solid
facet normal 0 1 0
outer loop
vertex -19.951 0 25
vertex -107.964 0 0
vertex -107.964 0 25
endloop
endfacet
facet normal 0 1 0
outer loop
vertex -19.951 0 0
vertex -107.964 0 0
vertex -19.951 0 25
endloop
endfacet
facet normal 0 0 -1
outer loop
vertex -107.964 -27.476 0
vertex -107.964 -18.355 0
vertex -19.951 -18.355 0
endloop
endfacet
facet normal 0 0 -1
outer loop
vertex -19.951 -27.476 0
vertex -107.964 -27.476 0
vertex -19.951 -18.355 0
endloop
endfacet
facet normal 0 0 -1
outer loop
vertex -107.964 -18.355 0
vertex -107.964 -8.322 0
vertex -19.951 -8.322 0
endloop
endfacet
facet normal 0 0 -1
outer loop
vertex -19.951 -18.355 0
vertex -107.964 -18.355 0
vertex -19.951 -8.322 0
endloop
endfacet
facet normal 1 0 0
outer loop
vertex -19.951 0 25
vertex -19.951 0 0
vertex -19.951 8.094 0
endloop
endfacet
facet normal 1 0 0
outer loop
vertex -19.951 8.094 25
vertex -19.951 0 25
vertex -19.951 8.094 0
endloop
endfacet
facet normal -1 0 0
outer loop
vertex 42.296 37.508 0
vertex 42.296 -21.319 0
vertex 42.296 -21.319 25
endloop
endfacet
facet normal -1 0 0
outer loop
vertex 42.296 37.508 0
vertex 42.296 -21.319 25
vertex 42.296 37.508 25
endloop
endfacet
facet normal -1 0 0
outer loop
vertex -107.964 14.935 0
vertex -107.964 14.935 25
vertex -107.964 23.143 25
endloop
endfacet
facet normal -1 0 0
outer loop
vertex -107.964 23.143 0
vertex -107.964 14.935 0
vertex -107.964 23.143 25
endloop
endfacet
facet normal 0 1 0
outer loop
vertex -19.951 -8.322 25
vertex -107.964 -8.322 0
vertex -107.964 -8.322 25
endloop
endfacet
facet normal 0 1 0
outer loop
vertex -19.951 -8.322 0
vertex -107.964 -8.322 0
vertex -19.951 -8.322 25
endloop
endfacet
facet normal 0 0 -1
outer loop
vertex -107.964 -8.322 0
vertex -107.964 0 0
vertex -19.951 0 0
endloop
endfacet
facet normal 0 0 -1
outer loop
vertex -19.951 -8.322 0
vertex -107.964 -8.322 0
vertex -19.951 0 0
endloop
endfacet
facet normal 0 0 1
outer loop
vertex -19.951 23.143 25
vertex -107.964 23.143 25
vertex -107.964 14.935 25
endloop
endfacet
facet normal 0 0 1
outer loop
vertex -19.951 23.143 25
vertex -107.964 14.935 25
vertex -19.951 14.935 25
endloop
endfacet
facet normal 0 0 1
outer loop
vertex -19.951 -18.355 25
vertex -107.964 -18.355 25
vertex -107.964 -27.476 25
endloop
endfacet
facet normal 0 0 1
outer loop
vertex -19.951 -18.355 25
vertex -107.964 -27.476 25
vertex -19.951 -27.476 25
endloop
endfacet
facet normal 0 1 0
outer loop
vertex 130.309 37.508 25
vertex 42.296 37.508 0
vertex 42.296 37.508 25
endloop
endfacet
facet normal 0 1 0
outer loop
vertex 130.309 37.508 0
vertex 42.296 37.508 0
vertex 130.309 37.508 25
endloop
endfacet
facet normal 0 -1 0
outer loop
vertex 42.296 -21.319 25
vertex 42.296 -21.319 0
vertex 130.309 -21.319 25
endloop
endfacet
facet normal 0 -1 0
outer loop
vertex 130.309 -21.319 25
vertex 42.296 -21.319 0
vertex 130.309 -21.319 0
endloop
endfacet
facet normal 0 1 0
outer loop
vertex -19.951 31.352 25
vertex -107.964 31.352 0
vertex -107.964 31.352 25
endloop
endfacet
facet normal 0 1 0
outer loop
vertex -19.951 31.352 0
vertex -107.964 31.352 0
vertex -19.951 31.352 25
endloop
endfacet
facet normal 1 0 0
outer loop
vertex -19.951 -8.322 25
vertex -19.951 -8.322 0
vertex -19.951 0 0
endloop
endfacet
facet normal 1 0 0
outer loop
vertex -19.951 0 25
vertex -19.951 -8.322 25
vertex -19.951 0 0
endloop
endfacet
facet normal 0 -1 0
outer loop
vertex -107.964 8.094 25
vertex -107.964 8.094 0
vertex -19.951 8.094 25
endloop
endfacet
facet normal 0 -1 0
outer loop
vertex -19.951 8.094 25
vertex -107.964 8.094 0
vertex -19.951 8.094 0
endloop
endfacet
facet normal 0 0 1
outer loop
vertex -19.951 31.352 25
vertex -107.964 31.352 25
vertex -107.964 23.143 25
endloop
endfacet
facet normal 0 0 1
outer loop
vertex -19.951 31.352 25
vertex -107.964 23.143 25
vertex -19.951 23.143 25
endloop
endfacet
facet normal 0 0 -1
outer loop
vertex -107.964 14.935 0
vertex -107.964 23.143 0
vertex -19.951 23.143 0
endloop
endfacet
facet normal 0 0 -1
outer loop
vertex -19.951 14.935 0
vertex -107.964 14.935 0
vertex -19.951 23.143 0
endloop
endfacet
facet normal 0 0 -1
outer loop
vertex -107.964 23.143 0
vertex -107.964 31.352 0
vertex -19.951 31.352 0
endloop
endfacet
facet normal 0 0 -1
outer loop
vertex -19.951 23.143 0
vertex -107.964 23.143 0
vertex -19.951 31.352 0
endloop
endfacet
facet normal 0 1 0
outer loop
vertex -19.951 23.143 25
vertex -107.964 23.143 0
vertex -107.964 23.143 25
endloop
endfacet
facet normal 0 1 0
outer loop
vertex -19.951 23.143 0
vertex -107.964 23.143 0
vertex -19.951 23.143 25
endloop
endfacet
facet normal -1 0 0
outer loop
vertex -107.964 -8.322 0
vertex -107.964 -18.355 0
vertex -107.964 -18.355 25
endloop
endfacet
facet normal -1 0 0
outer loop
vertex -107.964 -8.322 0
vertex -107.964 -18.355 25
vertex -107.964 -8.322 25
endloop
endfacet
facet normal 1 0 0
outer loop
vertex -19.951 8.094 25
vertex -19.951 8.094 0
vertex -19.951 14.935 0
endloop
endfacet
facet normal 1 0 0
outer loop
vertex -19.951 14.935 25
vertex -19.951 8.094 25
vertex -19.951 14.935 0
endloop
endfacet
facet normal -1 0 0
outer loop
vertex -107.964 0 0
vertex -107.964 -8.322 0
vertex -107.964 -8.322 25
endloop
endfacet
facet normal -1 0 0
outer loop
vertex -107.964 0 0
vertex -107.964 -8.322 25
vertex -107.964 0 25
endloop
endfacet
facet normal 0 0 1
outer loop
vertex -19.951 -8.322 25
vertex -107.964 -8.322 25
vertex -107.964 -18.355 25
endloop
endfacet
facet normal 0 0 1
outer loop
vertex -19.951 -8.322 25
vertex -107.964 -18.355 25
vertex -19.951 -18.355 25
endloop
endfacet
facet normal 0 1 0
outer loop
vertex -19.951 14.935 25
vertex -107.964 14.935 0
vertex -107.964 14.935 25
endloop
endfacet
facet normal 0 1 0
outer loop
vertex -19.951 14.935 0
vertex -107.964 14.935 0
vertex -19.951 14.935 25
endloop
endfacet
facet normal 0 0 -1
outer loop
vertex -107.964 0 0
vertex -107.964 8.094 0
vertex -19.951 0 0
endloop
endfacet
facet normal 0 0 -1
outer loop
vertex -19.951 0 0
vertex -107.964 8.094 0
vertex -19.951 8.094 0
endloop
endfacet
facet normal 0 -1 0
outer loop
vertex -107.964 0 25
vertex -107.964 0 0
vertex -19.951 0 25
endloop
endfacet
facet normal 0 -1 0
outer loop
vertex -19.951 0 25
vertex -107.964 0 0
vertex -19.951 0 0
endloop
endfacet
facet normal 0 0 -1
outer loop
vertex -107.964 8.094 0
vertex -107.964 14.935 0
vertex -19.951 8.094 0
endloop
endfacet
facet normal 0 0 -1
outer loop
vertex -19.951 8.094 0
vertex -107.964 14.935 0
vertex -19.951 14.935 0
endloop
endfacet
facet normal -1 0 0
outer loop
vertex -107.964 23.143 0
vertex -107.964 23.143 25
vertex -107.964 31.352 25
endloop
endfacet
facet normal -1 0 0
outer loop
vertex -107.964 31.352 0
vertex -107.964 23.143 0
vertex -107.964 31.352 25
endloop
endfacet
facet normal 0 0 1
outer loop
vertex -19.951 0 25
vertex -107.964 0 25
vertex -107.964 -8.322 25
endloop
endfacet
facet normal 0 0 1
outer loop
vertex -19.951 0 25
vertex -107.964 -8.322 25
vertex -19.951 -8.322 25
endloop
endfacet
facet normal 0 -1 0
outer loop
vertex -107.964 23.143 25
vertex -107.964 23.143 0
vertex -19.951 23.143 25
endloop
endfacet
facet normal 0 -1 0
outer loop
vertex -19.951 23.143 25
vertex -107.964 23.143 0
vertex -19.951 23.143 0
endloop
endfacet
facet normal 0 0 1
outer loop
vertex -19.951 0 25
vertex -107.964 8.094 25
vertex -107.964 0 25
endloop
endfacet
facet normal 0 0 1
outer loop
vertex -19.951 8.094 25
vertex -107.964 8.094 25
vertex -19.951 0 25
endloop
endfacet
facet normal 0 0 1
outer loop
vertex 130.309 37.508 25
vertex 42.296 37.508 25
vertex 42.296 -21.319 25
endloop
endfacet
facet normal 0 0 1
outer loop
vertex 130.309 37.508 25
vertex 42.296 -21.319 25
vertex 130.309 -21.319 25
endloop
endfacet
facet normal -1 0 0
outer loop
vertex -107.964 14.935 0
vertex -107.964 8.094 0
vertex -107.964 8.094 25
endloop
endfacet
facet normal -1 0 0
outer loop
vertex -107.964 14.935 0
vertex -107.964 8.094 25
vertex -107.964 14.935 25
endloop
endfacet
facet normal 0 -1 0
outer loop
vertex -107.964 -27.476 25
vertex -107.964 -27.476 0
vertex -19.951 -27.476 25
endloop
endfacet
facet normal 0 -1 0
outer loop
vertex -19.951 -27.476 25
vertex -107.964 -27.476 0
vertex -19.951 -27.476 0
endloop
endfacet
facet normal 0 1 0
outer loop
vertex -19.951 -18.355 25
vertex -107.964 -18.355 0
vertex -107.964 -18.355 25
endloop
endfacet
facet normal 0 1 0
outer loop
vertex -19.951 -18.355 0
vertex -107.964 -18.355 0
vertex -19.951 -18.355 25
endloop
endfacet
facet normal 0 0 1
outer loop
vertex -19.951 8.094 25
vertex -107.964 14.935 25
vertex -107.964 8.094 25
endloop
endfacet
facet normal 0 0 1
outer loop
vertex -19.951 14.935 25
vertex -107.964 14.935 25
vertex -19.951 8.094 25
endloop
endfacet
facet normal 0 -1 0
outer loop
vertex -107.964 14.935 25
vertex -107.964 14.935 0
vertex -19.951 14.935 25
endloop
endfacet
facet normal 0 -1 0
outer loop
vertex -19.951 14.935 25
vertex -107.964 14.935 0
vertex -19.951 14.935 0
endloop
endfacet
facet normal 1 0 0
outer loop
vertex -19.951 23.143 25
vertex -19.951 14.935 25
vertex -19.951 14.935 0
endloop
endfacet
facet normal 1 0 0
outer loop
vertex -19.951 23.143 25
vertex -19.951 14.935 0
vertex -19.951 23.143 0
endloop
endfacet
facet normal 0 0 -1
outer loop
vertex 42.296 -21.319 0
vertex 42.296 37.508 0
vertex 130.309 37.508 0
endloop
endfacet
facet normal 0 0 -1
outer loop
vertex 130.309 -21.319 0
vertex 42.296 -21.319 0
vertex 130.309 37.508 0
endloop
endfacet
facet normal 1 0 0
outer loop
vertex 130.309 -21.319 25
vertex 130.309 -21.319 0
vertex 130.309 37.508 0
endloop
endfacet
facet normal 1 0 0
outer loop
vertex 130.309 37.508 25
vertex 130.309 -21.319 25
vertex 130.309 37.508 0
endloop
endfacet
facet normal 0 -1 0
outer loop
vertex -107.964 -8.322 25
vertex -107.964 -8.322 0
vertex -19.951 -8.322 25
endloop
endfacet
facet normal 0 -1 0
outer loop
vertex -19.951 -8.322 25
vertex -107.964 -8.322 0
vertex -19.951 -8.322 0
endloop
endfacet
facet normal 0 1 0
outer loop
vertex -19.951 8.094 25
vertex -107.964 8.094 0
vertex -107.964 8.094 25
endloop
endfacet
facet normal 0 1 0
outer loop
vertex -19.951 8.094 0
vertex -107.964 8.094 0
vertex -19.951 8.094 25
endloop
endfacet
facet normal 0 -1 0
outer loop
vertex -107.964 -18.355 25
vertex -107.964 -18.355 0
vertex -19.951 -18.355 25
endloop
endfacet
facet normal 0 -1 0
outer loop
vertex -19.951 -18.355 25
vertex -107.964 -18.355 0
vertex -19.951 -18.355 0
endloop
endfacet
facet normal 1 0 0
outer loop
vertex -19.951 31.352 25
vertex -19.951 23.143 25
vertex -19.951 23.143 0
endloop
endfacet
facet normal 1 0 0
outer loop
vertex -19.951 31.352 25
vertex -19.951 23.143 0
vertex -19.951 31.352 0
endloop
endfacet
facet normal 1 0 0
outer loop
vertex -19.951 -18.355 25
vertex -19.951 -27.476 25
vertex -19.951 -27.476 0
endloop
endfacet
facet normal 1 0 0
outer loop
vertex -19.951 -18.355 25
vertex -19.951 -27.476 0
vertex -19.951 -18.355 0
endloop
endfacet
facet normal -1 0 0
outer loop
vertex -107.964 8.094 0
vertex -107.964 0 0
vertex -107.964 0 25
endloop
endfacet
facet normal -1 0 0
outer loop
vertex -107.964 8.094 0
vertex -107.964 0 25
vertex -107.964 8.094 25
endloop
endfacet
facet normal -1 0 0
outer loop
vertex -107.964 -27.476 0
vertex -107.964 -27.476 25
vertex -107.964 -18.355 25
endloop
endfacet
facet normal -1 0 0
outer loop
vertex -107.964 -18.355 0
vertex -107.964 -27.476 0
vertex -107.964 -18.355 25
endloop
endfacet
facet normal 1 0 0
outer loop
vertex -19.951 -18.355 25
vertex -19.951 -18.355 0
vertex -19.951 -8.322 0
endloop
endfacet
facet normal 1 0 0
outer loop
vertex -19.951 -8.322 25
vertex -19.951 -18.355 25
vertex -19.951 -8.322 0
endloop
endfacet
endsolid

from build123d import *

# Parameters (mm, degrees)
F0_W     = 88.01288
F0_H     = 58.82726
F1_DEPTH = 25
F0_H_2   = 8.208456
F2_DEPTH = 25
F3_DEPTH = 25
F0_H_3   = 6.840379
F4_DEPTH = 25
F0_H_4   = 8.094443
F5_DEPTH = 25
F0_H_5   = 8.322465
F6_DEPTH = 25
F0_H_6   = 10.032556
F7_DEPTH = 25
F0_H_7   = 9.120506
F8_DEPTH = 25


with BuildPart() as f1:
    # F0 (on Top) → F1 (new body)
    with BuildSketch(Plane.XY):
        with Locations((86.302772, 8.094443)):
            Rectangle(F0_W, F0_H)
    extrude(amount=F1_DEPTH)


with BuildPart() as f2:
    # F0 (on Top) → F2 (new body)
    with BuildSketch(Plane.XY):
        with Locations((-63.957547, 27.247506)):
            Rectangle(F0_W, F0_H_2)
    extrude(amount=F2_DEPTH)


with BuildPart() as f3:
    # F0 (on Top) → F3 (new body)
    with BuildSketch(Plane.XY):
        with Locations((-63.957547, 19.03905)):
            Rectangle(F0_W, F0_H_2)
    extrude(amount=F3_DEPTH)


with BuildPart() as f4:
    # F0 (on Top) → F4 (new body)
    with BuildSketch(Plane.XY):
        with Locations((-63.957547, 11.514632)):
            Rectangle(F0_W, F0_H_3)
    extrude(amount=F4_DEPTH)


with BuildPart() as f5:
    # F0 (on Top) → F5 (new body)
    with BuildSketch(Plane.XY):
        with Locations((-63.957547, 4.047222)):
            Rectangle(F0_W, F0_H_4)
    extrude(amount=F5_DEPTH)


with BuildPart() as f6:
    # F0 (on Top) → F6 (new body)
    with BuildSketch(Plane.XY):
        with Locations((-63.957547, -4.161232)):
            Rectangle(F0_W, F0_H_5)
    extrude(amount=F6_DEPTH)


with BuildPart() as f7:
    # F0 (on Top) → F7 (new body)
    with BuildSketch(Plane.XY):
        with Locations((-63.957547, -13.338743)):
            Rectangle(F0_W, F0_H_6)
    extrude(amount=F7_DEPTH)


with BuildPart() as f8:
    # F0 (on Top) → F8 (new body)
    with BuildSketch(Plane.XY):
        with Locations((-63.957547, -22.915274)):
            Rectangle(F0_W, F0_H_7)
    extrude(amount=F8_DEPTH)


solid = Compound([f1.part, f2.part, f3.part, f4.part, f5.part, f6.part, f7.part, f8.part])
